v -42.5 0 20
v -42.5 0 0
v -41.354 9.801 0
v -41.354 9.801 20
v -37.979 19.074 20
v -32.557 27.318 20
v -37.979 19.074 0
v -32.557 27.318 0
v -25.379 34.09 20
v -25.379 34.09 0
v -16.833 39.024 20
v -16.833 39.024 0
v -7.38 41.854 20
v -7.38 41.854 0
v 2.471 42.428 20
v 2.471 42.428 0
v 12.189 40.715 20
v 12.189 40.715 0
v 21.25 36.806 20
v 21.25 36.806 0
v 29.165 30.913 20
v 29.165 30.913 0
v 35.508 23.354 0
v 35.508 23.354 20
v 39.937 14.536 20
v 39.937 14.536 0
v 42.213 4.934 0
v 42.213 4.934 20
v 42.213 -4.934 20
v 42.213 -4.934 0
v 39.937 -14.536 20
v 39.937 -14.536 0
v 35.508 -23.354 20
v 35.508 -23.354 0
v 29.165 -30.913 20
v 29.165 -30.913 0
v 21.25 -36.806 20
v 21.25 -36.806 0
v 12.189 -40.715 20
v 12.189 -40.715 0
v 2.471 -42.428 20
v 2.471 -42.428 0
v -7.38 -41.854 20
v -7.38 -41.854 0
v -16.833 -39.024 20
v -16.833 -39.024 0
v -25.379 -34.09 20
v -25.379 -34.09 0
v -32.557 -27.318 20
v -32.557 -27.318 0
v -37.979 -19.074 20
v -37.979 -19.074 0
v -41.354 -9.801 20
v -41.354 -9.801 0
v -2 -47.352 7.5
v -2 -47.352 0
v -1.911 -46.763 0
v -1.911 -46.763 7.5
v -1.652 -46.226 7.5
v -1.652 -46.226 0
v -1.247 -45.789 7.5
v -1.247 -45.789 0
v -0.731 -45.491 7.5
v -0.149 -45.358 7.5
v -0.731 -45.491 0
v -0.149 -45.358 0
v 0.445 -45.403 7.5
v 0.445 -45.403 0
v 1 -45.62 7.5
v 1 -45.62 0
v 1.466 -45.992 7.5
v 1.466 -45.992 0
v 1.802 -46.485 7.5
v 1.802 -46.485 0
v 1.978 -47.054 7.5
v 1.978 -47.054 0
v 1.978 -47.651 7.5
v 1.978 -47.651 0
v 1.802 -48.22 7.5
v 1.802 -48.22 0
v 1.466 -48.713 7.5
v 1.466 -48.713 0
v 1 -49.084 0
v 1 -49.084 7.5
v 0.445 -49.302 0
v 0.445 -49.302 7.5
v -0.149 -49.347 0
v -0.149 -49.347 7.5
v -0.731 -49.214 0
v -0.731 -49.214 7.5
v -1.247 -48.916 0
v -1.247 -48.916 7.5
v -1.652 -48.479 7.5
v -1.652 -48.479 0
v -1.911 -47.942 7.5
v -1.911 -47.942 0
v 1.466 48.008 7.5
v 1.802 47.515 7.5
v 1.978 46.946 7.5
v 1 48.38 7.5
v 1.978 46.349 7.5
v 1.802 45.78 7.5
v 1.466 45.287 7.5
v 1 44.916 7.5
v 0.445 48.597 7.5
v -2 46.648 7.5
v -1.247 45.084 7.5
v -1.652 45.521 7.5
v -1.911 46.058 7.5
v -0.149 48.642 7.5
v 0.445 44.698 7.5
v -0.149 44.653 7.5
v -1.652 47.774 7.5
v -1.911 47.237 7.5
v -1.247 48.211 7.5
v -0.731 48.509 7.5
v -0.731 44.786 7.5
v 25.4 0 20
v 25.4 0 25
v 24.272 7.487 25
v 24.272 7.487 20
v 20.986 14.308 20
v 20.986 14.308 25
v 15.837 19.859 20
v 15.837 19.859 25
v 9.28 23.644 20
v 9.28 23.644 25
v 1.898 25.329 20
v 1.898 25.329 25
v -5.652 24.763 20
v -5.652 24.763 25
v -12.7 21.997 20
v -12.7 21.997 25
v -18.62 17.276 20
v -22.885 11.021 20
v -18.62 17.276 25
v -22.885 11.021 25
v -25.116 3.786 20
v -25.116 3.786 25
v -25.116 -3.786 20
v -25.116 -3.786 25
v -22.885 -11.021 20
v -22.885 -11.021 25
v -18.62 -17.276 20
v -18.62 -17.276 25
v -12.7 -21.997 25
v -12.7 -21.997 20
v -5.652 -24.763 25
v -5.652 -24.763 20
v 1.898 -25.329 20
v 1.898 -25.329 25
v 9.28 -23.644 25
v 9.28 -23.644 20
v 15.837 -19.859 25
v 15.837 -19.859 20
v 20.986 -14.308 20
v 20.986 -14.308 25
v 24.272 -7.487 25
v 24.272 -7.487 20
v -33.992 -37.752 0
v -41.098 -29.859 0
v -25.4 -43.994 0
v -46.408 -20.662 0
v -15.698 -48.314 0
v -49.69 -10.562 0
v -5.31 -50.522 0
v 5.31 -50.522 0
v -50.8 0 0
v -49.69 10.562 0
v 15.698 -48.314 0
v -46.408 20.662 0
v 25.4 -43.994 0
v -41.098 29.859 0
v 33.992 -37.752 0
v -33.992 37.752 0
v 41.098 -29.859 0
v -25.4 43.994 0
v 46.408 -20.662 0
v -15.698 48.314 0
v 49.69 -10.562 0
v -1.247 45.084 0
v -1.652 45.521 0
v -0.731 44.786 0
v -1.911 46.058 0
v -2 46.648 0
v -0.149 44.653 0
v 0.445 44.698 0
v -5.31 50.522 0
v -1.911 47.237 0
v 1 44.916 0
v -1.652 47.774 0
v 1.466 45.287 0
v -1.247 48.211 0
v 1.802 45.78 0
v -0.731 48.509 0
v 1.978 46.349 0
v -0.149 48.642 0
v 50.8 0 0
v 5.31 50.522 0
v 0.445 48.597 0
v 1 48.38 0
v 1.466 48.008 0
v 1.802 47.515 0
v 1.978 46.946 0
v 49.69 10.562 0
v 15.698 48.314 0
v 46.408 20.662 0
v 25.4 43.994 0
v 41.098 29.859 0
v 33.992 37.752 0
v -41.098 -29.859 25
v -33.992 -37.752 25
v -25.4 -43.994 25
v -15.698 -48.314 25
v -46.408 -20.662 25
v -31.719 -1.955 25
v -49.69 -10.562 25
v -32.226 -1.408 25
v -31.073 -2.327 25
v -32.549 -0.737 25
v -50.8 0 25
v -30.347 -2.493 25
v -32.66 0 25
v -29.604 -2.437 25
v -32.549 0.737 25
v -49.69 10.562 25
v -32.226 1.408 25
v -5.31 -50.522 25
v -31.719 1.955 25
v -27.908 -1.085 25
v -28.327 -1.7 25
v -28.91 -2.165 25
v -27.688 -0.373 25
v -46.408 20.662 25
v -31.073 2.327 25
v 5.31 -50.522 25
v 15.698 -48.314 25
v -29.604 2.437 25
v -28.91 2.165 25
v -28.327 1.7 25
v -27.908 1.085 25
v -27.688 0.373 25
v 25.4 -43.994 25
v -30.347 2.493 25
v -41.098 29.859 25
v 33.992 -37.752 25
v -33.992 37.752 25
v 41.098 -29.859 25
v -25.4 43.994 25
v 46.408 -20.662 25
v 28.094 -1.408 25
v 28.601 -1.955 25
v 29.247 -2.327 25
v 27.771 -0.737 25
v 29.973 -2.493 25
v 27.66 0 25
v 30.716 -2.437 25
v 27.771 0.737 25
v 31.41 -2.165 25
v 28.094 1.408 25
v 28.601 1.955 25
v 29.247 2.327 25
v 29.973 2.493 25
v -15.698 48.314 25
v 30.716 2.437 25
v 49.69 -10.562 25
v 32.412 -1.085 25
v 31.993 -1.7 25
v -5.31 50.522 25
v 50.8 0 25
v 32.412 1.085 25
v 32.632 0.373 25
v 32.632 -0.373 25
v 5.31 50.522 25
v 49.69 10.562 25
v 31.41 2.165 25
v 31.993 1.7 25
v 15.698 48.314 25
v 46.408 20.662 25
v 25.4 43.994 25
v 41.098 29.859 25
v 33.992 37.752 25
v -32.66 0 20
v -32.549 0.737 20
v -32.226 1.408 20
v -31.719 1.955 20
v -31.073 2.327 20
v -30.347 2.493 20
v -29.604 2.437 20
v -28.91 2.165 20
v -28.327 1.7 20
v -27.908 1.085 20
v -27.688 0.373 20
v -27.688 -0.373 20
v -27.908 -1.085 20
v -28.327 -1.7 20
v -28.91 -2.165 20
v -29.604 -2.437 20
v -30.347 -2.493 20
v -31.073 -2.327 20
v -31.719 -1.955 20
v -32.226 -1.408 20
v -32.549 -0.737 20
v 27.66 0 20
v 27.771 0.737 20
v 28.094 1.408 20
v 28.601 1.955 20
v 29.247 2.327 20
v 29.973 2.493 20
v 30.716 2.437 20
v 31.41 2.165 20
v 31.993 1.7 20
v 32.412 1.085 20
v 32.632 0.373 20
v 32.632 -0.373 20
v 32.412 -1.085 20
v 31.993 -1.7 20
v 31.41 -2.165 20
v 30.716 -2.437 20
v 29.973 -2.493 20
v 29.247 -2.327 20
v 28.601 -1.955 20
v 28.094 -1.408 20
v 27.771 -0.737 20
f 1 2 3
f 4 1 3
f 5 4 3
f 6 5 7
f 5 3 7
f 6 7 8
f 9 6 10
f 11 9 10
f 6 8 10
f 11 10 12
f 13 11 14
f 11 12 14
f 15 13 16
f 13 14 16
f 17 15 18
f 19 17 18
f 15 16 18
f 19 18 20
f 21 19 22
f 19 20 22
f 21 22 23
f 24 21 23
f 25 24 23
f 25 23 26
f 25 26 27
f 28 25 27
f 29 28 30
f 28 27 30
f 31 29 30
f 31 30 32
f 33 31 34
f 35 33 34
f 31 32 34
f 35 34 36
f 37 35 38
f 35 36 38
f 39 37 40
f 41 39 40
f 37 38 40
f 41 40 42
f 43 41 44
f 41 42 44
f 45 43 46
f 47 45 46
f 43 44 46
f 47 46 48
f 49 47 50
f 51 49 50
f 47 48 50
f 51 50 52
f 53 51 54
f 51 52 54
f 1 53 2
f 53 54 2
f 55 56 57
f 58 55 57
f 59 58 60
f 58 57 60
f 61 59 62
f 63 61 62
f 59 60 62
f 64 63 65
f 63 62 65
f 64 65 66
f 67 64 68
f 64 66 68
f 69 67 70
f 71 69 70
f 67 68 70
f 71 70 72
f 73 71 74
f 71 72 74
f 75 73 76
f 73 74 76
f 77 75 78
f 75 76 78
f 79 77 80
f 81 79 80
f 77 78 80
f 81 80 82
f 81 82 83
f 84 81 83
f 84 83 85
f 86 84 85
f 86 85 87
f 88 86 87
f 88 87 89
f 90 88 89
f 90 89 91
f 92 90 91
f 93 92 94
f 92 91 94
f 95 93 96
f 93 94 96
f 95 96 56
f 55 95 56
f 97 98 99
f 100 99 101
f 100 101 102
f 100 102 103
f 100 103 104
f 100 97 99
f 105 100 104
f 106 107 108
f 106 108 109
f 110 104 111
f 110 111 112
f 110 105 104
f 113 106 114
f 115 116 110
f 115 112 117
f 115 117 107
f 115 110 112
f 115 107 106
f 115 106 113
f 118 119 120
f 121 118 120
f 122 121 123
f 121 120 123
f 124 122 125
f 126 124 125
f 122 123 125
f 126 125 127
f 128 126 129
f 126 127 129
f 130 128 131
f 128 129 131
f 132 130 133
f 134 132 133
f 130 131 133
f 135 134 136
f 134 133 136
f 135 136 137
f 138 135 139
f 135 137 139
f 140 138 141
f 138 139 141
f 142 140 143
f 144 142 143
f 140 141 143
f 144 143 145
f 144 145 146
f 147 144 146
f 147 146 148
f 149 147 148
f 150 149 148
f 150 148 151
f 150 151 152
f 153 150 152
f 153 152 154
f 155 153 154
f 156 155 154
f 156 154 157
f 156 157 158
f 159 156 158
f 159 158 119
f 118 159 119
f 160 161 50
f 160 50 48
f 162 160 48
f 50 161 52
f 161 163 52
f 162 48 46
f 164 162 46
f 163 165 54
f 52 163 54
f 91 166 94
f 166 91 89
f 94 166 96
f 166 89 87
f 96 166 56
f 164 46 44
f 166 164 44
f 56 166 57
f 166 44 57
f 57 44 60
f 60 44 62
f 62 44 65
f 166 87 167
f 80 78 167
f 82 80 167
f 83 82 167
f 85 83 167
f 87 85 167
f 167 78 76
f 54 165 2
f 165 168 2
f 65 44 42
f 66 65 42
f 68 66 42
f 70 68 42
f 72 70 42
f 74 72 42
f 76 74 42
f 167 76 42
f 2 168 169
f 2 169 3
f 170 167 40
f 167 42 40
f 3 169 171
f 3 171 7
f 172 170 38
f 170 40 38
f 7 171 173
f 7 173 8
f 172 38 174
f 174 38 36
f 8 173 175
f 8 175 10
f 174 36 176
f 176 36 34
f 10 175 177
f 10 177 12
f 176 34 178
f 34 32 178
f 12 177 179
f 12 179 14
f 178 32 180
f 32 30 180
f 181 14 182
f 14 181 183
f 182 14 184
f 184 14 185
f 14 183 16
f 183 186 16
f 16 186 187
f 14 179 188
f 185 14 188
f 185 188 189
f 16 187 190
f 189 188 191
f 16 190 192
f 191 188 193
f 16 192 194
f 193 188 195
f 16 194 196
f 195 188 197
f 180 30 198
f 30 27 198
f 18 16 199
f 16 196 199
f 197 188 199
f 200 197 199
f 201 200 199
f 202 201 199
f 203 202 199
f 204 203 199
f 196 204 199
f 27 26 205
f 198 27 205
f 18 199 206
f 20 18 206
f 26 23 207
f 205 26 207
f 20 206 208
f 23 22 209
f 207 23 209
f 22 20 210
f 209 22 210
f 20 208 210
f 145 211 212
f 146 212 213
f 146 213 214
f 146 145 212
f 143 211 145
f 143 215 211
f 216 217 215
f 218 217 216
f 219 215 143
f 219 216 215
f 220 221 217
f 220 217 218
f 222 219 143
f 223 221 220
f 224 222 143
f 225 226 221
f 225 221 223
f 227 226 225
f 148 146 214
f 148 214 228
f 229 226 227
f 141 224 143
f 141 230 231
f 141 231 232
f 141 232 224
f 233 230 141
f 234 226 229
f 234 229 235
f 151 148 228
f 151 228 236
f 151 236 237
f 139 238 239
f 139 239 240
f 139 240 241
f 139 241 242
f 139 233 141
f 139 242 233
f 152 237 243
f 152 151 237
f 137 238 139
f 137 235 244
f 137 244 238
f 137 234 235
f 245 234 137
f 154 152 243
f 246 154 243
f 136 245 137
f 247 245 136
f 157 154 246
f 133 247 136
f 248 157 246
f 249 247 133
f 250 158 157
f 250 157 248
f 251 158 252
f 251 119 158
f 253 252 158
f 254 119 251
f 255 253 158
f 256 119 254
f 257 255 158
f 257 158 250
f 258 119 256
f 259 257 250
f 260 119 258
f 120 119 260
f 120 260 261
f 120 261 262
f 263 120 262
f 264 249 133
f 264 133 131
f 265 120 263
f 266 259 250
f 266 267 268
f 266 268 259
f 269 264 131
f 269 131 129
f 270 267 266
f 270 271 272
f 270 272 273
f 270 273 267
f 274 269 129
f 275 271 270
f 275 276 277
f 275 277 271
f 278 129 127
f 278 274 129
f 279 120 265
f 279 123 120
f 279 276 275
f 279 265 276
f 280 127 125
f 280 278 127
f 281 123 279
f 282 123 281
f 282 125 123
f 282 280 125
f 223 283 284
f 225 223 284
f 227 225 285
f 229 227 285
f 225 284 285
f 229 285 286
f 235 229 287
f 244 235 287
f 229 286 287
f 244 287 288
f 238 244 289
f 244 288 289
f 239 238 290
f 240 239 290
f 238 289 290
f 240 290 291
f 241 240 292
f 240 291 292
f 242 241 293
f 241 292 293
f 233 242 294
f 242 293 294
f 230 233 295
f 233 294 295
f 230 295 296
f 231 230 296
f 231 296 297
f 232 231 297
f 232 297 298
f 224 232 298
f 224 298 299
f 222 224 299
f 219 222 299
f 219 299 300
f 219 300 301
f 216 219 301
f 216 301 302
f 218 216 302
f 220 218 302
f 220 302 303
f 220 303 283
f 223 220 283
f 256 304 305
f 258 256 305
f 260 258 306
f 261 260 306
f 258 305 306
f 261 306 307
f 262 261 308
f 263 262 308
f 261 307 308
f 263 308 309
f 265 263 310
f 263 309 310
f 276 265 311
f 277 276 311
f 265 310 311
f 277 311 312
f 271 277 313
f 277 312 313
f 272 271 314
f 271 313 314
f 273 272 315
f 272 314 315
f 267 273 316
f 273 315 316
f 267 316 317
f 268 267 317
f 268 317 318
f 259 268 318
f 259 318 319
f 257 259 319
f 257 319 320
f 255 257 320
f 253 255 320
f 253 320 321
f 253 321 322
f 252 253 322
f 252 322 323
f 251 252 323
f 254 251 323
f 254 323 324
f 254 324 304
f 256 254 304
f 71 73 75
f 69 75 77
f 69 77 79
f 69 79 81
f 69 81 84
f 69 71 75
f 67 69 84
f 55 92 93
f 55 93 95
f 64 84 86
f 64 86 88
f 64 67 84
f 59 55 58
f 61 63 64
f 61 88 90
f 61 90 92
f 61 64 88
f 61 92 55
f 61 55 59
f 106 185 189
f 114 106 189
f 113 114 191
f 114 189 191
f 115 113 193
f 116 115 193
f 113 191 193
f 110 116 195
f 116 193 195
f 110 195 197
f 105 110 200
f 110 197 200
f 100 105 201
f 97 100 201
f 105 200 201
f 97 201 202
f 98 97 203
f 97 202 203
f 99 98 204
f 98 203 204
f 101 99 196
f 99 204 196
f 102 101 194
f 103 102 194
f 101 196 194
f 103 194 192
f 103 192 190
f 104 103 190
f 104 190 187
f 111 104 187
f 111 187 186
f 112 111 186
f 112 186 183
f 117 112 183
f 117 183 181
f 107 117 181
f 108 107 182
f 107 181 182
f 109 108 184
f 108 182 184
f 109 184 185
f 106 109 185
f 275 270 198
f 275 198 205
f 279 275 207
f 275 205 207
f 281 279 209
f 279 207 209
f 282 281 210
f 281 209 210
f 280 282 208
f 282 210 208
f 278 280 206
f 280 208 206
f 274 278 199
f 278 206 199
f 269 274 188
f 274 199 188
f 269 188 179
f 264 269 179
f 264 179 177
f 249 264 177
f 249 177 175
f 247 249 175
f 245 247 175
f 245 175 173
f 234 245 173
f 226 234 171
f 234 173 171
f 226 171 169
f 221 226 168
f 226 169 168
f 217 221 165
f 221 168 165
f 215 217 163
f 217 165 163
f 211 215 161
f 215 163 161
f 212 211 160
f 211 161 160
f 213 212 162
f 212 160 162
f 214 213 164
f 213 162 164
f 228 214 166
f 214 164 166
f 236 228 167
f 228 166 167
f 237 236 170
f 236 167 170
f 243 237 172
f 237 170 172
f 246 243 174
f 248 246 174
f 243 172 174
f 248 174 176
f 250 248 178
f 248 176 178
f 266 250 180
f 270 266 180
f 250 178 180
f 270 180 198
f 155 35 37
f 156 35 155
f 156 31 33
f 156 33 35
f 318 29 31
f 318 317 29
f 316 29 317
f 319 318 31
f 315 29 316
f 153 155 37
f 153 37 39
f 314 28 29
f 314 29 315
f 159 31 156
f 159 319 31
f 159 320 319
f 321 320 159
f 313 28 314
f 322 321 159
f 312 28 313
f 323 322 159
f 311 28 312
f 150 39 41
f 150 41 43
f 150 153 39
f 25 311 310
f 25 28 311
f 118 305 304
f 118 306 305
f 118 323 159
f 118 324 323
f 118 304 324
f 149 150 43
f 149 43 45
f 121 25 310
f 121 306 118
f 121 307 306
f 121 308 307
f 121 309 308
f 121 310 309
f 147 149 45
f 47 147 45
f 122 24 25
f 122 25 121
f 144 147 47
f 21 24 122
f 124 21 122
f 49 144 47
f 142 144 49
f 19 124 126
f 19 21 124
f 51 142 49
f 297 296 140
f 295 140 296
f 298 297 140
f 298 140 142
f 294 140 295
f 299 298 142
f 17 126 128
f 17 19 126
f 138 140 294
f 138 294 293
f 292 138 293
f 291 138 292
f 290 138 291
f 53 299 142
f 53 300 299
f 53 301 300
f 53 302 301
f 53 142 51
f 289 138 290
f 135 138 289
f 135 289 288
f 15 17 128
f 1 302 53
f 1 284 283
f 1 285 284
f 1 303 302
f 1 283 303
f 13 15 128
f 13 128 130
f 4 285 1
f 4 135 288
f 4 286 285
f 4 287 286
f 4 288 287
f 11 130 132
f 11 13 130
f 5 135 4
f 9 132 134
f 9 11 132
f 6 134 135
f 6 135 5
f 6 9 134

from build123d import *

# Parameters (mm, degrees)
ESQUISSE1_R             = 50.8
BOSS_EXTRU_1_DEPTH      = 25
ESQUISSE2_R             = 25.4
ENL_V_MAT_EXTRU_1_DEPTH = 26
ESQUISSE3_R             = 42.5
ENL_V_MAT_EXTRU_2_DEPTH = 20
ESQUISSE4_R             = 2.5
ENL_V_MAT_EXTRU_3_DEPTH = 6
ESQUISSE5_R             = 2
ENL_V_MAT_EXTRU_4_DEPTH = 7.5


with BuildPart() as part:
    # Esquisse1 → Boss.-Extru.1 (new body)
    with BuildSketch(Plane.XY):
        Circle(ESQUISSE1_R)
    extrude(amount=BOSS_EXTRU_1_DEPTH)

    # Esquisse2 → Enlèv. mat.-Extru.1 (cut, through all)
    with BuildSketch(Plane.XY.offset(25)):
        Circle(ESQUISSE2_R)
    extrude(amount=-ENL_V_MAT_EXTRU_1_DEPTH, mode=Mode.SUBTRACT)

    # Esquisse3 → Enlèv. mat.-Extru.2 (cut)
    with BuildSketch(Plane(origin=(0, 0, 0), x_dir=(-1, 0, 0), z_dir=(0, 0, -1))):
        Circle(ESQUISSE3_R)
    extrude(amount=-ENL_V_MAT_EXTRU_2_DEPTH, mode=Mode.SUBTRACT)

    # Esquisse4 → Enlèv. mat.-Extru.3 (cut, through all)
    with BuildSketch(Plane(origin=(0, 0, 20), x_dir=(-1, 0, 0), z_dir=(0, 0, -1))):
        with Locations((-30.16, 0)):
            Circle(ESQUISSE4_R)
        with Locations((30.16, 0)):
            Circle(ESQUISSE4_R)
    extrude(amount=-ENL_V_MAT_EXTRU_3_DEPTH, mode=Mode.SUBTRACT)

    # Esquisse5 → Enlèv. mat.-Extru.4 (cut)
    with BuildSketch(Plane(origin=(0, 0, 0), x_dir=(-1, 0, 0), z_dir=(0, 0, -1))):
        with Locations((0, 46.647557519)):
            Circle(ESQUISSE5_R)
        with Locations((0, -47.352442481)):
            Circle(ESQUISSE5_R)
    extrude(amount=-ENL_V_MAT_EXTRU_4_DEPTH, mode=Mode.SUBTRACT)


solid = part.part
